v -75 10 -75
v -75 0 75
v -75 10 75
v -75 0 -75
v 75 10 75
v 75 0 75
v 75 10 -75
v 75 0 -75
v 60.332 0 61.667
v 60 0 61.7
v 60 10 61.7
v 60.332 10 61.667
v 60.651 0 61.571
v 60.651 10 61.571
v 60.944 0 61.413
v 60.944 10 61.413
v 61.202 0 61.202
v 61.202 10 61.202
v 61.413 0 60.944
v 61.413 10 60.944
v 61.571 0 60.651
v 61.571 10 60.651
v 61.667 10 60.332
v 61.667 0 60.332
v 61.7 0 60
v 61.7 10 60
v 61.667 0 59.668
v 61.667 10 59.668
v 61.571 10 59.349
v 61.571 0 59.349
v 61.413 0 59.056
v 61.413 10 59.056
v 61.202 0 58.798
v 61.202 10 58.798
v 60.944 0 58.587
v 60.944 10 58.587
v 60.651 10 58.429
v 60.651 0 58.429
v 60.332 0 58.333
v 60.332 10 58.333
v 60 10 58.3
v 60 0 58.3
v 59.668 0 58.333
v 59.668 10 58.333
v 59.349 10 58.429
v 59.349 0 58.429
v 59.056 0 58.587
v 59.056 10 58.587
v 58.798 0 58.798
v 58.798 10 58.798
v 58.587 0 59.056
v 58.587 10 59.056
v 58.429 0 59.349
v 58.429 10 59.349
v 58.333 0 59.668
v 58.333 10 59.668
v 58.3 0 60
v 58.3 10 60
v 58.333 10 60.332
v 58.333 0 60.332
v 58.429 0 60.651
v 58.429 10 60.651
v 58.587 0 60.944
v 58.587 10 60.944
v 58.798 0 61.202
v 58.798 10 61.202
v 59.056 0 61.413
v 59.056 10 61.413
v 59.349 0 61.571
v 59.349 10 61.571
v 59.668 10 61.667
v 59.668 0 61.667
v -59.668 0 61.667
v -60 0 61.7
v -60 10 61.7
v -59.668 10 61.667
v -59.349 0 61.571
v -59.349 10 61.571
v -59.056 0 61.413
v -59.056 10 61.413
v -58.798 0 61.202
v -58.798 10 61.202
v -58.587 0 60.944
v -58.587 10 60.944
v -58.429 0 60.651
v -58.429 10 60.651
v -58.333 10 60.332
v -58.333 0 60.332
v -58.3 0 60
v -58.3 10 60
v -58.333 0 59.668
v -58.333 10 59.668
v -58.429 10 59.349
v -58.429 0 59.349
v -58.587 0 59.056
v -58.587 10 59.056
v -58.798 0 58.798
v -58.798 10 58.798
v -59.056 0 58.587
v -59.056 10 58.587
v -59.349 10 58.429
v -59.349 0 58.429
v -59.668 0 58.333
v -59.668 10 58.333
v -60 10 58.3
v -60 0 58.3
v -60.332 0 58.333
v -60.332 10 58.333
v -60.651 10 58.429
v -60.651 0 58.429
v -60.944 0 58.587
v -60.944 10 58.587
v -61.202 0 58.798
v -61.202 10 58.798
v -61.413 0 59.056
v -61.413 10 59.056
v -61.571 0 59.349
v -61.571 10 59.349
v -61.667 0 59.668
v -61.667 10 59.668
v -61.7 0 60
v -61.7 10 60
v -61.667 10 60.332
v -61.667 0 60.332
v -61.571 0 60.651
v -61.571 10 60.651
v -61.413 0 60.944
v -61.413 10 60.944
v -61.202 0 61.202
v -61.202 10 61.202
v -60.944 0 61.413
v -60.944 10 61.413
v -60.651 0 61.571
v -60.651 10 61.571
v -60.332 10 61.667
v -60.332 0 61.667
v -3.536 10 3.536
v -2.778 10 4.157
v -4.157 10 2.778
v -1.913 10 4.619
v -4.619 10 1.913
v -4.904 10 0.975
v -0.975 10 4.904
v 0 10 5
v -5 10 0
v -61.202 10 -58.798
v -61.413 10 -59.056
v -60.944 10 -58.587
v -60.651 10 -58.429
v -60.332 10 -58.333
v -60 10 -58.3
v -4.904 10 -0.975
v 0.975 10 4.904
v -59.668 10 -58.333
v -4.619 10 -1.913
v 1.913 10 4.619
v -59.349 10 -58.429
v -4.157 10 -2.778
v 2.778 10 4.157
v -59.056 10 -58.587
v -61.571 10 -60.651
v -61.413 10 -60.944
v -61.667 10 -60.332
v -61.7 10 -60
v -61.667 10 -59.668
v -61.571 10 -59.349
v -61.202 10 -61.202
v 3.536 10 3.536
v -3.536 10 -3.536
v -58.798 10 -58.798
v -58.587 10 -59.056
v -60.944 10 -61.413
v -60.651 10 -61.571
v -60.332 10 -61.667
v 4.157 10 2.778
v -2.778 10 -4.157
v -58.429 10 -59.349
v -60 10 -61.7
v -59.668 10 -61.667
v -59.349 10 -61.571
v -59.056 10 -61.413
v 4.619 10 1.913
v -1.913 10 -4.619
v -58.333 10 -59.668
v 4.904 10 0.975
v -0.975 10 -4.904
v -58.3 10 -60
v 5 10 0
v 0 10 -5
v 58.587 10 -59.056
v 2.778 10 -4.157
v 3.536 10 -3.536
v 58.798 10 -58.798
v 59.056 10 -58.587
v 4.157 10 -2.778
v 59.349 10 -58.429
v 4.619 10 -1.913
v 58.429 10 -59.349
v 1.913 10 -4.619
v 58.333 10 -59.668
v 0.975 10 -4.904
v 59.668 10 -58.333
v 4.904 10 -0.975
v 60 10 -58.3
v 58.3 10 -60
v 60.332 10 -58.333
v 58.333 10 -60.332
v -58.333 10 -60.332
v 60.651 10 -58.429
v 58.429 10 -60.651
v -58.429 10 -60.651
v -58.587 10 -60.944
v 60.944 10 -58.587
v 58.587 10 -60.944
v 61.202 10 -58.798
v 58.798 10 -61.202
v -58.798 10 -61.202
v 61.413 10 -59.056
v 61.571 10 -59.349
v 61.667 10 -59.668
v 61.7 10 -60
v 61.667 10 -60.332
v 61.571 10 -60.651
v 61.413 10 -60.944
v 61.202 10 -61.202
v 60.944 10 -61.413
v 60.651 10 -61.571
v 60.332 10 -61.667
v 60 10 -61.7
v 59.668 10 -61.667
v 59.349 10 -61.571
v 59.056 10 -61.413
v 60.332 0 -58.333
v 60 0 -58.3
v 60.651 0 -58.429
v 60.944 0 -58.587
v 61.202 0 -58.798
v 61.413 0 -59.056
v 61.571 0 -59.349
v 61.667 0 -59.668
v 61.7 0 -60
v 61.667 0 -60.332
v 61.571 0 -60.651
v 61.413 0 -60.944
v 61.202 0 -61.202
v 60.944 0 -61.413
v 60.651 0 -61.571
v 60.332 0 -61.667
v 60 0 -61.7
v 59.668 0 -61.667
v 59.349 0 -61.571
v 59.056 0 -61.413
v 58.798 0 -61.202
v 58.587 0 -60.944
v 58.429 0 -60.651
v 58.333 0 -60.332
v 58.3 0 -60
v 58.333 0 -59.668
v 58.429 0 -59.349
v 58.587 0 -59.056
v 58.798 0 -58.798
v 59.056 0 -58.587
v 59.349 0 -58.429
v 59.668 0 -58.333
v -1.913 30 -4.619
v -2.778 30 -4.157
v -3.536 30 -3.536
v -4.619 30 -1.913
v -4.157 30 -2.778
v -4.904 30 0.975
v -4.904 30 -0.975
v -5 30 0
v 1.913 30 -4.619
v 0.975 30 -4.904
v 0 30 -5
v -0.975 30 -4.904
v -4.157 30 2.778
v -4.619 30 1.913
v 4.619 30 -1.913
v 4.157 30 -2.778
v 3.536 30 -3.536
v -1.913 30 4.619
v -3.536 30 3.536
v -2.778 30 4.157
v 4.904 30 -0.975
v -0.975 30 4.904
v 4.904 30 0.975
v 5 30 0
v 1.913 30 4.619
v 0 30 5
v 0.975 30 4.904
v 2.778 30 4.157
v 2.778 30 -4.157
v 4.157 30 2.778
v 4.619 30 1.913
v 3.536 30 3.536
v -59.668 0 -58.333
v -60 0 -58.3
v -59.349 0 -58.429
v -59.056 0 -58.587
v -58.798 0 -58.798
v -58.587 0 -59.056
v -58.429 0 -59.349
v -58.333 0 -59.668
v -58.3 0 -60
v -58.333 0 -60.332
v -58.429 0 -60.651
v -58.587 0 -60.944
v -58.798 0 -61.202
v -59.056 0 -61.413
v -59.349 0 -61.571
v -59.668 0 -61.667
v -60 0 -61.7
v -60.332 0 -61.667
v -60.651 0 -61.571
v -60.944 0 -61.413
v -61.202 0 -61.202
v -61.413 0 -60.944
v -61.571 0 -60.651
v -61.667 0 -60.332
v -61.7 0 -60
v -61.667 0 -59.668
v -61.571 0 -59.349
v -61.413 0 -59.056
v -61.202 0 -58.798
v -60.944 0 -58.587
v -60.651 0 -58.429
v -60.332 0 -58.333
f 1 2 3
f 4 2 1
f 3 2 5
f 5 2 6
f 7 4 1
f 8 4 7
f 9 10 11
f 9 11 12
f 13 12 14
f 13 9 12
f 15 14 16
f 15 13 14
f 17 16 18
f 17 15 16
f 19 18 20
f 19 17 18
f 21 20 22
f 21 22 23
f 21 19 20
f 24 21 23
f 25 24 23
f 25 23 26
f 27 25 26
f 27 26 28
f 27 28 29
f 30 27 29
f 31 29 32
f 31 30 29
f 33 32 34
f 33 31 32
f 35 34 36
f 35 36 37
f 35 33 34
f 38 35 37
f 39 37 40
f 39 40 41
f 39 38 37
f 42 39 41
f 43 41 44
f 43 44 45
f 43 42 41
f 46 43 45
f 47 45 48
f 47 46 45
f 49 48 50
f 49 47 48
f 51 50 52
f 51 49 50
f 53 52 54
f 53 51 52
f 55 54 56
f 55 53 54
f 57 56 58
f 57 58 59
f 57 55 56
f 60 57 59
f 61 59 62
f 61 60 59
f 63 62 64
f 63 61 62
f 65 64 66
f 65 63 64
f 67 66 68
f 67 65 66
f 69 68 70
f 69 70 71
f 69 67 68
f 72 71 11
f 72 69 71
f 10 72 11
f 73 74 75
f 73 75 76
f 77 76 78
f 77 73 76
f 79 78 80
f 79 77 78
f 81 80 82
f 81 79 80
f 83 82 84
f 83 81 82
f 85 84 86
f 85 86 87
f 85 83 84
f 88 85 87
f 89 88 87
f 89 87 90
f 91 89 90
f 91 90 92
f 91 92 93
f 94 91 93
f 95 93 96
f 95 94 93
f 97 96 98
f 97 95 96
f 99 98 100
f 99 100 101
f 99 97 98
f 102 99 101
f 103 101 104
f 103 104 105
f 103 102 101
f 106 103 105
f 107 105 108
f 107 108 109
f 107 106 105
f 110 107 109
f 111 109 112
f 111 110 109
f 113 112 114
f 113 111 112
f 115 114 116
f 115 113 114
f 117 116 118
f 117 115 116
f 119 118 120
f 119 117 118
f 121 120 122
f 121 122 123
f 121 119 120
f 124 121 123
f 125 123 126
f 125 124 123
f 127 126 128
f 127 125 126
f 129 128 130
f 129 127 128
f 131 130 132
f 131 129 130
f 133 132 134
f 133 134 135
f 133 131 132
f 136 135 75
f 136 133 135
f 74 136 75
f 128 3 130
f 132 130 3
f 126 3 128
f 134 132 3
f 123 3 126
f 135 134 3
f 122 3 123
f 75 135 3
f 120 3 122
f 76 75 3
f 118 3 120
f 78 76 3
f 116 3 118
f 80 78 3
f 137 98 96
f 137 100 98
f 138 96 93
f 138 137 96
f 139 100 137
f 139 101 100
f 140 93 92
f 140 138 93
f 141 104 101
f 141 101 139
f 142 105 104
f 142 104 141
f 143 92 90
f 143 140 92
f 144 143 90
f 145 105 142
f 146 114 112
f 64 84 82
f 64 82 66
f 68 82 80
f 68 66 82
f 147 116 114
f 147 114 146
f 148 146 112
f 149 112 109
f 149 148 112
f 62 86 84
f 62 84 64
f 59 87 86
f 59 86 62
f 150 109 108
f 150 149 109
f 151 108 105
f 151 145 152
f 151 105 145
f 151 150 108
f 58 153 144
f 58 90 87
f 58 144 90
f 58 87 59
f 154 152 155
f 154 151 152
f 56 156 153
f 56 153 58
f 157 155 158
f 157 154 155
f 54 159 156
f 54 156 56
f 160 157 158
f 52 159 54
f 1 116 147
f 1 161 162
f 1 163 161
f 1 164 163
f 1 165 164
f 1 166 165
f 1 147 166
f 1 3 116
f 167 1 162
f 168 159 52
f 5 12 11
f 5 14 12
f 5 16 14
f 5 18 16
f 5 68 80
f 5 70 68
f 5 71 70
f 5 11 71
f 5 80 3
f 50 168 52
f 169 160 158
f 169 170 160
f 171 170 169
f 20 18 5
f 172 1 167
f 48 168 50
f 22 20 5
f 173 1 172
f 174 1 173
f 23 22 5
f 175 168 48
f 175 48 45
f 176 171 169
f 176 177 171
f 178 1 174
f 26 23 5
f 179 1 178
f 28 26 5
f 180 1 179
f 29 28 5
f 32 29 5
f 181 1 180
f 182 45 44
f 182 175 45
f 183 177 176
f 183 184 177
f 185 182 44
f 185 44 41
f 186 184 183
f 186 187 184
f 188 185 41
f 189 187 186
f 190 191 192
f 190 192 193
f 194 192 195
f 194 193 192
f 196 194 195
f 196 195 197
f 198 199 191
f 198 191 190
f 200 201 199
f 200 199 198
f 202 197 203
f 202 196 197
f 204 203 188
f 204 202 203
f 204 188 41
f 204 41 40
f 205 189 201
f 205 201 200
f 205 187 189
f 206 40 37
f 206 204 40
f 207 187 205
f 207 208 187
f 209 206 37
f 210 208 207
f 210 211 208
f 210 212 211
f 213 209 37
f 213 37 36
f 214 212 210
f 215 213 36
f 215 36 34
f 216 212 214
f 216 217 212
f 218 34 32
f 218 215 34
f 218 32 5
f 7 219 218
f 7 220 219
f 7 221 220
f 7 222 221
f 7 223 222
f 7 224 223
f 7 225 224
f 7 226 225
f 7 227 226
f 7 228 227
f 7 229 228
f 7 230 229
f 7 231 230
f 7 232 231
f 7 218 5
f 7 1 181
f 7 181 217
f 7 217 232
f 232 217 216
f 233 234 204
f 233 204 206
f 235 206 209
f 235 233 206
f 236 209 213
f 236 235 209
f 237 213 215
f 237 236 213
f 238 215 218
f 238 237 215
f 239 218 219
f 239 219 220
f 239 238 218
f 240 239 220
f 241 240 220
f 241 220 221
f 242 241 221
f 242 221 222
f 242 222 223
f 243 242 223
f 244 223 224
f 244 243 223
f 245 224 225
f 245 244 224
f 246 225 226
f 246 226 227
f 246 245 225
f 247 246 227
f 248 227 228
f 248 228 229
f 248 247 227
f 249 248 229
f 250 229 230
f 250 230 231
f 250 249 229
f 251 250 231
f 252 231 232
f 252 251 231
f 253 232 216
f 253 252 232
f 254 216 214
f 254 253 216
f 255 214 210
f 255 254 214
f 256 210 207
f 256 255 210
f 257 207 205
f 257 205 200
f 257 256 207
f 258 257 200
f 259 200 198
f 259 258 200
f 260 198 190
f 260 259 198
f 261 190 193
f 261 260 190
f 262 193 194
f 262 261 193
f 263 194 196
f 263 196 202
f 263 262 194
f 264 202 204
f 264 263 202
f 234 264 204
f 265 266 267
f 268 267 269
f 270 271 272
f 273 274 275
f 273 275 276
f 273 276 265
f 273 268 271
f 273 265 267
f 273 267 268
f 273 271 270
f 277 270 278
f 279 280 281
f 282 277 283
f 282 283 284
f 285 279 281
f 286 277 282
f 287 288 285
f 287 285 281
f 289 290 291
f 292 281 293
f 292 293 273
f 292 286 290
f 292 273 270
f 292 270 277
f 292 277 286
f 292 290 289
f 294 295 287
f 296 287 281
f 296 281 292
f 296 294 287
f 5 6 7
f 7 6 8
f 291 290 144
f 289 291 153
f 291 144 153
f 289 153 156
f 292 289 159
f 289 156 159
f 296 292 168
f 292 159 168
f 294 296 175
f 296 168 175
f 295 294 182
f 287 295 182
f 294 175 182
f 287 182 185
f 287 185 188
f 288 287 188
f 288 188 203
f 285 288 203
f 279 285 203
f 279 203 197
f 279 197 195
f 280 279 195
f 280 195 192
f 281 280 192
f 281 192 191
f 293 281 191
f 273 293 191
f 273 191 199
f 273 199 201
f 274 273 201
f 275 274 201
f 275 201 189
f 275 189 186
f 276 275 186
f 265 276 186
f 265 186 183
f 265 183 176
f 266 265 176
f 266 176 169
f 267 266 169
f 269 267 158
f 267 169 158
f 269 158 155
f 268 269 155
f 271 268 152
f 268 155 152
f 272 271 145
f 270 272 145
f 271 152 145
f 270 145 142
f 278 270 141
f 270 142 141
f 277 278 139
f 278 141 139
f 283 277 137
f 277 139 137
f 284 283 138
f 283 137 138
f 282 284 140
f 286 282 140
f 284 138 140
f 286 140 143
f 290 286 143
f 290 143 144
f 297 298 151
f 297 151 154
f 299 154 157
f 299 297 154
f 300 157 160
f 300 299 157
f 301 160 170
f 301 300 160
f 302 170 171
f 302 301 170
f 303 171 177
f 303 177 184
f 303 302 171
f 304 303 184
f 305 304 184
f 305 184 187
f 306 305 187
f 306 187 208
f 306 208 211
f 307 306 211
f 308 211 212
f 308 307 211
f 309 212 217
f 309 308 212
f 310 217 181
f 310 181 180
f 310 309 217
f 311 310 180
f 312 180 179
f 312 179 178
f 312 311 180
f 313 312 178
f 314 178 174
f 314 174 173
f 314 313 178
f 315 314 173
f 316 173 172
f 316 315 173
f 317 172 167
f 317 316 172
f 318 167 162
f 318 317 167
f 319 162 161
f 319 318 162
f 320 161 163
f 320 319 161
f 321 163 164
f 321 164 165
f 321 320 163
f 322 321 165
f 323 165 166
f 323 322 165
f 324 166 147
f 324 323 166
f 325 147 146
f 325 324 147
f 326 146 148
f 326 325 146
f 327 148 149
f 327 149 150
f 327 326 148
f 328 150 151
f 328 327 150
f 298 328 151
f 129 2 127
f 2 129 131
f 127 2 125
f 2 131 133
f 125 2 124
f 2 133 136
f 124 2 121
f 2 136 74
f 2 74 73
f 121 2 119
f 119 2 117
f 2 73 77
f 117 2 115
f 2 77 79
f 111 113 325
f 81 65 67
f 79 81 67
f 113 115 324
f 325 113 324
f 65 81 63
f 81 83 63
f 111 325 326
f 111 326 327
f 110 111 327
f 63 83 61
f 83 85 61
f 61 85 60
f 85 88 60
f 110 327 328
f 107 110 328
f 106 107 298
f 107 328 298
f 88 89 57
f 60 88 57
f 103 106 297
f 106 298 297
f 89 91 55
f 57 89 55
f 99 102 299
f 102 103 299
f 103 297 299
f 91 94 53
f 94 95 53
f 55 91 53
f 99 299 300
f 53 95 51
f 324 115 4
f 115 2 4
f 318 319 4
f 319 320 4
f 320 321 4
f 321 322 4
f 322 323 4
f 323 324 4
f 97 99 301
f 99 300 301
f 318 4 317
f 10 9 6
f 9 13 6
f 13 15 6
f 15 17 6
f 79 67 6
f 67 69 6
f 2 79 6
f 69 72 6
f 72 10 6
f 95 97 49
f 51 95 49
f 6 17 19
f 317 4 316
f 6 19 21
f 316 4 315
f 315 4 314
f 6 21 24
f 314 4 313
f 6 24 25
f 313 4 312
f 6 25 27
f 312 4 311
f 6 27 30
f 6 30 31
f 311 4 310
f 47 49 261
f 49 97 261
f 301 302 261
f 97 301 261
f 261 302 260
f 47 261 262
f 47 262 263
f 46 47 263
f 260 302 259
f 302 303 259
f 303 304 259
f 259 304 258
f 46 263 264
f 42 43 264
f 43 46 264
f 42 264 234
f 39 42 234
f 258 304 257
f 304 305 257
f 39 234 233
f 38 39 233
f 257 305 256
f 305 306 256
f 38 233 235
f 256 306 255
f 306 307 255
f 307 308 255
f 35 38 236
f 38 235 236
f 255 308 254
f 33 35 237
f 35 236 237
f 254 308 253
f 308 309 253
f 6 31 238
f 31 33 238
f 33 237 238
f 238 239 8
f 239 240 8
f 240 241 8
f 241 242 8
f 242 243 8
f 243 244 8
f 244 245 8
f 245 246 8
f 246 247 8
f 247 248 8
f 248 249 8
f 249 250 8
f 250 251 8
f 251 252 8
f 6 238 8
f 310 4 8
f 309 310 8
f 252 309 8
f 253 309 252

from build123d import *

# Parameters (mm, degrees)
SKETCH2_W           = 150
SKETCH2_H           = 150
SKETCH2_R           = 1.7
SKETCH2_R_2         = 5
BOSS_EXTRUDE1_DEPTH = 10
SKETCH2_3_R         = 5
BOSS_EXTRUDE2_DEPTH = 30


with BuildPart() as part:
    # Sketch2 → Boss-Extrude1 (new body)
    with BuildSketch(Plane(origin=(0, 0, 0), x_dir=(1, 0, 0), z_dir=(0, 1, 0))):
        Rectangle(SKETCH2_W, SKETCH2_H)
        with Locations((-60, -60)):
            Circle(SKETCH2_R, mode=Mode.SUBTRACT)
        with Locations((60, -60)):
            Circle(SKETCH2_R, mode=Mode.SUBTRACT)
        with Locations((-60, 60)):
            Circle(SKETCH2_R, mode=Mode.SUBTRACT)
        Circle(SKETCH2_R_2, mode=Mode.SUBTRACT)
        with Locations((60, 60)):
            Circle(SKETCH2_R, mode=Mode.SUBTRACT)
    extrude(amount=BOSS_EXTRUDE1_DEPTH)

    # Sketch2<3> → Boss-Extrude2 (add)
    with BuildSketch(Plane(origin=(0, 0, 0), x_dir=(1, 0, 0), z_dir=(0, 1, 0))):
        Circle(SKETCH2_3_R)
    extrude(amount=BOSS_EXTRUDE2_DEPTH)


solid = part.part
